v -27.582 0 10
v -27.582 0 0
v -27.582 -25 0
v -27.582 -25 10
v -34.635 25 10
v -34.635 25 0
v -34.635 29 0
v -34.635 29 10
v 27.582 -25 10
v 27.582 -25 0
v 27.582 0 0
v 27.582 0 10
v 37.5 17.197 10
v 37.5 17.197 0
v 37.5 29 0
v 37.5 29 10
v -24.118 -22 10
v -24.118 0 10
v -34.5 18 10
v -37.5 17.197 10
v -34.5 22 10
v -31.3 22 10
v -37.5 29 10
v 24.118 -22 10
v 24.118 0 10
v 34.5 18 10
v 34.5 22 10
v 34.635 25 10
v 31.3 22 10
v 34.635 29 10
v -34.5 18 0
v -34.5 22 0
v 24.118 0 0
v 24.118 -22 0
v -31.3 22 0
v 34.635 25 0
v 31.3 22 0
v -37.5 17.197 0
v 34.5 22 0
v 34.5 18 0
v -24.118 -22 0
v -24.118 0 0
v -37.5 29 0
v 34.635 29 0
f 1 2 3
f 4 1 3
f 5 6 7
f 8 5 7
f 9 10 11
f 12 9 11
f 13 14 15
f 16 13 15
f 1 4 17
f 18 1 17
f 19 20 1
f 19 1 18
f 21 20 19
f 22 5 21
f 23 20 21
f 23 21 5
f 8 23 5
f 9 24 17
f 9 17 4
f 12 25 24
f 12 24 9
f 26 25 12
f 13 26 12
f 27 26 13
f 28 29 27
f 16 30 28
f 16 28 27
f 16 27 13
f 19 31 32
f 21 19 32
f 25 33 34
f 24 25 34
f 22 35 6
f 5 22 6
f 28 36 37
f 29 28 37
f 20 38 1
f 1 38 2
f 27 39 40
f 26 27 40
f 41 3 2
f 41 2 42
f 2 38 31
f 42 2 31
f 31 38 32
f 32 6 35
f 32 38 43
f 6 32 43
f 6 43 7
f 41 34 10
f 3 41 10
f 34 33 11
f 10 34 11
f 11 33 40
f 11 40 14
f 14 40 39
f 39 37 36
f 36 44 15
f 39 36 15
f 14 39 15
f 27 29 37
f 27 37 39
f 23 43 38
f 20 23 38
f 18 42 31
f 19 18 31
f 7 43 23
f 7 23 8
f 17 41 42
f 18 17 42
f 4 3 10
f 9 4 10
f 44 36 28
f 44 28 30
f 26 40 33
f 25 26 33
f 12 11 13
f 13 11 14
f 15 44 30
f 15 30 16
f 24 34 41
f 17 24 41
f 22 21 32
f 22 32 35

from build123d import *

# Parameters (mm, degrees)
F0_W     = 2.864896
F0_H     = 4
F1_DEPTH = 10


with BuildPart() as f1:
    # F0 (on Top) → F1 (new body)
    with BuildSketch(Plane.XY):
        with Locations((-36.067552, 27)):
            Rectangle(F0_W, F0_H)
        with Locations((36.067552, 27)):
            Rectangle(F0_W, F0_H)
        Polygon((27.581504, -25), (27.581504, 0), (37.5, 17.196862), (37.5, 25), (34.635104, 25), (31.3, 22), (34.5, 22), (34.5, 18), (25.84857, 3), (24.118284, 0), (24.118284, -22), (-24.118284, -22), (-24.118284, 0), (-25.84857, 3), (-34.5, 18), (-34.5, 22), (-31.3, 22), (-34.635104, 25), (-37.5, 25), (-37.5, 17.196862), (-27.581504, 0), (-27.581504, -25), align=None)
    extrude(amount=F1_DEPTH)


solid = f1.part
